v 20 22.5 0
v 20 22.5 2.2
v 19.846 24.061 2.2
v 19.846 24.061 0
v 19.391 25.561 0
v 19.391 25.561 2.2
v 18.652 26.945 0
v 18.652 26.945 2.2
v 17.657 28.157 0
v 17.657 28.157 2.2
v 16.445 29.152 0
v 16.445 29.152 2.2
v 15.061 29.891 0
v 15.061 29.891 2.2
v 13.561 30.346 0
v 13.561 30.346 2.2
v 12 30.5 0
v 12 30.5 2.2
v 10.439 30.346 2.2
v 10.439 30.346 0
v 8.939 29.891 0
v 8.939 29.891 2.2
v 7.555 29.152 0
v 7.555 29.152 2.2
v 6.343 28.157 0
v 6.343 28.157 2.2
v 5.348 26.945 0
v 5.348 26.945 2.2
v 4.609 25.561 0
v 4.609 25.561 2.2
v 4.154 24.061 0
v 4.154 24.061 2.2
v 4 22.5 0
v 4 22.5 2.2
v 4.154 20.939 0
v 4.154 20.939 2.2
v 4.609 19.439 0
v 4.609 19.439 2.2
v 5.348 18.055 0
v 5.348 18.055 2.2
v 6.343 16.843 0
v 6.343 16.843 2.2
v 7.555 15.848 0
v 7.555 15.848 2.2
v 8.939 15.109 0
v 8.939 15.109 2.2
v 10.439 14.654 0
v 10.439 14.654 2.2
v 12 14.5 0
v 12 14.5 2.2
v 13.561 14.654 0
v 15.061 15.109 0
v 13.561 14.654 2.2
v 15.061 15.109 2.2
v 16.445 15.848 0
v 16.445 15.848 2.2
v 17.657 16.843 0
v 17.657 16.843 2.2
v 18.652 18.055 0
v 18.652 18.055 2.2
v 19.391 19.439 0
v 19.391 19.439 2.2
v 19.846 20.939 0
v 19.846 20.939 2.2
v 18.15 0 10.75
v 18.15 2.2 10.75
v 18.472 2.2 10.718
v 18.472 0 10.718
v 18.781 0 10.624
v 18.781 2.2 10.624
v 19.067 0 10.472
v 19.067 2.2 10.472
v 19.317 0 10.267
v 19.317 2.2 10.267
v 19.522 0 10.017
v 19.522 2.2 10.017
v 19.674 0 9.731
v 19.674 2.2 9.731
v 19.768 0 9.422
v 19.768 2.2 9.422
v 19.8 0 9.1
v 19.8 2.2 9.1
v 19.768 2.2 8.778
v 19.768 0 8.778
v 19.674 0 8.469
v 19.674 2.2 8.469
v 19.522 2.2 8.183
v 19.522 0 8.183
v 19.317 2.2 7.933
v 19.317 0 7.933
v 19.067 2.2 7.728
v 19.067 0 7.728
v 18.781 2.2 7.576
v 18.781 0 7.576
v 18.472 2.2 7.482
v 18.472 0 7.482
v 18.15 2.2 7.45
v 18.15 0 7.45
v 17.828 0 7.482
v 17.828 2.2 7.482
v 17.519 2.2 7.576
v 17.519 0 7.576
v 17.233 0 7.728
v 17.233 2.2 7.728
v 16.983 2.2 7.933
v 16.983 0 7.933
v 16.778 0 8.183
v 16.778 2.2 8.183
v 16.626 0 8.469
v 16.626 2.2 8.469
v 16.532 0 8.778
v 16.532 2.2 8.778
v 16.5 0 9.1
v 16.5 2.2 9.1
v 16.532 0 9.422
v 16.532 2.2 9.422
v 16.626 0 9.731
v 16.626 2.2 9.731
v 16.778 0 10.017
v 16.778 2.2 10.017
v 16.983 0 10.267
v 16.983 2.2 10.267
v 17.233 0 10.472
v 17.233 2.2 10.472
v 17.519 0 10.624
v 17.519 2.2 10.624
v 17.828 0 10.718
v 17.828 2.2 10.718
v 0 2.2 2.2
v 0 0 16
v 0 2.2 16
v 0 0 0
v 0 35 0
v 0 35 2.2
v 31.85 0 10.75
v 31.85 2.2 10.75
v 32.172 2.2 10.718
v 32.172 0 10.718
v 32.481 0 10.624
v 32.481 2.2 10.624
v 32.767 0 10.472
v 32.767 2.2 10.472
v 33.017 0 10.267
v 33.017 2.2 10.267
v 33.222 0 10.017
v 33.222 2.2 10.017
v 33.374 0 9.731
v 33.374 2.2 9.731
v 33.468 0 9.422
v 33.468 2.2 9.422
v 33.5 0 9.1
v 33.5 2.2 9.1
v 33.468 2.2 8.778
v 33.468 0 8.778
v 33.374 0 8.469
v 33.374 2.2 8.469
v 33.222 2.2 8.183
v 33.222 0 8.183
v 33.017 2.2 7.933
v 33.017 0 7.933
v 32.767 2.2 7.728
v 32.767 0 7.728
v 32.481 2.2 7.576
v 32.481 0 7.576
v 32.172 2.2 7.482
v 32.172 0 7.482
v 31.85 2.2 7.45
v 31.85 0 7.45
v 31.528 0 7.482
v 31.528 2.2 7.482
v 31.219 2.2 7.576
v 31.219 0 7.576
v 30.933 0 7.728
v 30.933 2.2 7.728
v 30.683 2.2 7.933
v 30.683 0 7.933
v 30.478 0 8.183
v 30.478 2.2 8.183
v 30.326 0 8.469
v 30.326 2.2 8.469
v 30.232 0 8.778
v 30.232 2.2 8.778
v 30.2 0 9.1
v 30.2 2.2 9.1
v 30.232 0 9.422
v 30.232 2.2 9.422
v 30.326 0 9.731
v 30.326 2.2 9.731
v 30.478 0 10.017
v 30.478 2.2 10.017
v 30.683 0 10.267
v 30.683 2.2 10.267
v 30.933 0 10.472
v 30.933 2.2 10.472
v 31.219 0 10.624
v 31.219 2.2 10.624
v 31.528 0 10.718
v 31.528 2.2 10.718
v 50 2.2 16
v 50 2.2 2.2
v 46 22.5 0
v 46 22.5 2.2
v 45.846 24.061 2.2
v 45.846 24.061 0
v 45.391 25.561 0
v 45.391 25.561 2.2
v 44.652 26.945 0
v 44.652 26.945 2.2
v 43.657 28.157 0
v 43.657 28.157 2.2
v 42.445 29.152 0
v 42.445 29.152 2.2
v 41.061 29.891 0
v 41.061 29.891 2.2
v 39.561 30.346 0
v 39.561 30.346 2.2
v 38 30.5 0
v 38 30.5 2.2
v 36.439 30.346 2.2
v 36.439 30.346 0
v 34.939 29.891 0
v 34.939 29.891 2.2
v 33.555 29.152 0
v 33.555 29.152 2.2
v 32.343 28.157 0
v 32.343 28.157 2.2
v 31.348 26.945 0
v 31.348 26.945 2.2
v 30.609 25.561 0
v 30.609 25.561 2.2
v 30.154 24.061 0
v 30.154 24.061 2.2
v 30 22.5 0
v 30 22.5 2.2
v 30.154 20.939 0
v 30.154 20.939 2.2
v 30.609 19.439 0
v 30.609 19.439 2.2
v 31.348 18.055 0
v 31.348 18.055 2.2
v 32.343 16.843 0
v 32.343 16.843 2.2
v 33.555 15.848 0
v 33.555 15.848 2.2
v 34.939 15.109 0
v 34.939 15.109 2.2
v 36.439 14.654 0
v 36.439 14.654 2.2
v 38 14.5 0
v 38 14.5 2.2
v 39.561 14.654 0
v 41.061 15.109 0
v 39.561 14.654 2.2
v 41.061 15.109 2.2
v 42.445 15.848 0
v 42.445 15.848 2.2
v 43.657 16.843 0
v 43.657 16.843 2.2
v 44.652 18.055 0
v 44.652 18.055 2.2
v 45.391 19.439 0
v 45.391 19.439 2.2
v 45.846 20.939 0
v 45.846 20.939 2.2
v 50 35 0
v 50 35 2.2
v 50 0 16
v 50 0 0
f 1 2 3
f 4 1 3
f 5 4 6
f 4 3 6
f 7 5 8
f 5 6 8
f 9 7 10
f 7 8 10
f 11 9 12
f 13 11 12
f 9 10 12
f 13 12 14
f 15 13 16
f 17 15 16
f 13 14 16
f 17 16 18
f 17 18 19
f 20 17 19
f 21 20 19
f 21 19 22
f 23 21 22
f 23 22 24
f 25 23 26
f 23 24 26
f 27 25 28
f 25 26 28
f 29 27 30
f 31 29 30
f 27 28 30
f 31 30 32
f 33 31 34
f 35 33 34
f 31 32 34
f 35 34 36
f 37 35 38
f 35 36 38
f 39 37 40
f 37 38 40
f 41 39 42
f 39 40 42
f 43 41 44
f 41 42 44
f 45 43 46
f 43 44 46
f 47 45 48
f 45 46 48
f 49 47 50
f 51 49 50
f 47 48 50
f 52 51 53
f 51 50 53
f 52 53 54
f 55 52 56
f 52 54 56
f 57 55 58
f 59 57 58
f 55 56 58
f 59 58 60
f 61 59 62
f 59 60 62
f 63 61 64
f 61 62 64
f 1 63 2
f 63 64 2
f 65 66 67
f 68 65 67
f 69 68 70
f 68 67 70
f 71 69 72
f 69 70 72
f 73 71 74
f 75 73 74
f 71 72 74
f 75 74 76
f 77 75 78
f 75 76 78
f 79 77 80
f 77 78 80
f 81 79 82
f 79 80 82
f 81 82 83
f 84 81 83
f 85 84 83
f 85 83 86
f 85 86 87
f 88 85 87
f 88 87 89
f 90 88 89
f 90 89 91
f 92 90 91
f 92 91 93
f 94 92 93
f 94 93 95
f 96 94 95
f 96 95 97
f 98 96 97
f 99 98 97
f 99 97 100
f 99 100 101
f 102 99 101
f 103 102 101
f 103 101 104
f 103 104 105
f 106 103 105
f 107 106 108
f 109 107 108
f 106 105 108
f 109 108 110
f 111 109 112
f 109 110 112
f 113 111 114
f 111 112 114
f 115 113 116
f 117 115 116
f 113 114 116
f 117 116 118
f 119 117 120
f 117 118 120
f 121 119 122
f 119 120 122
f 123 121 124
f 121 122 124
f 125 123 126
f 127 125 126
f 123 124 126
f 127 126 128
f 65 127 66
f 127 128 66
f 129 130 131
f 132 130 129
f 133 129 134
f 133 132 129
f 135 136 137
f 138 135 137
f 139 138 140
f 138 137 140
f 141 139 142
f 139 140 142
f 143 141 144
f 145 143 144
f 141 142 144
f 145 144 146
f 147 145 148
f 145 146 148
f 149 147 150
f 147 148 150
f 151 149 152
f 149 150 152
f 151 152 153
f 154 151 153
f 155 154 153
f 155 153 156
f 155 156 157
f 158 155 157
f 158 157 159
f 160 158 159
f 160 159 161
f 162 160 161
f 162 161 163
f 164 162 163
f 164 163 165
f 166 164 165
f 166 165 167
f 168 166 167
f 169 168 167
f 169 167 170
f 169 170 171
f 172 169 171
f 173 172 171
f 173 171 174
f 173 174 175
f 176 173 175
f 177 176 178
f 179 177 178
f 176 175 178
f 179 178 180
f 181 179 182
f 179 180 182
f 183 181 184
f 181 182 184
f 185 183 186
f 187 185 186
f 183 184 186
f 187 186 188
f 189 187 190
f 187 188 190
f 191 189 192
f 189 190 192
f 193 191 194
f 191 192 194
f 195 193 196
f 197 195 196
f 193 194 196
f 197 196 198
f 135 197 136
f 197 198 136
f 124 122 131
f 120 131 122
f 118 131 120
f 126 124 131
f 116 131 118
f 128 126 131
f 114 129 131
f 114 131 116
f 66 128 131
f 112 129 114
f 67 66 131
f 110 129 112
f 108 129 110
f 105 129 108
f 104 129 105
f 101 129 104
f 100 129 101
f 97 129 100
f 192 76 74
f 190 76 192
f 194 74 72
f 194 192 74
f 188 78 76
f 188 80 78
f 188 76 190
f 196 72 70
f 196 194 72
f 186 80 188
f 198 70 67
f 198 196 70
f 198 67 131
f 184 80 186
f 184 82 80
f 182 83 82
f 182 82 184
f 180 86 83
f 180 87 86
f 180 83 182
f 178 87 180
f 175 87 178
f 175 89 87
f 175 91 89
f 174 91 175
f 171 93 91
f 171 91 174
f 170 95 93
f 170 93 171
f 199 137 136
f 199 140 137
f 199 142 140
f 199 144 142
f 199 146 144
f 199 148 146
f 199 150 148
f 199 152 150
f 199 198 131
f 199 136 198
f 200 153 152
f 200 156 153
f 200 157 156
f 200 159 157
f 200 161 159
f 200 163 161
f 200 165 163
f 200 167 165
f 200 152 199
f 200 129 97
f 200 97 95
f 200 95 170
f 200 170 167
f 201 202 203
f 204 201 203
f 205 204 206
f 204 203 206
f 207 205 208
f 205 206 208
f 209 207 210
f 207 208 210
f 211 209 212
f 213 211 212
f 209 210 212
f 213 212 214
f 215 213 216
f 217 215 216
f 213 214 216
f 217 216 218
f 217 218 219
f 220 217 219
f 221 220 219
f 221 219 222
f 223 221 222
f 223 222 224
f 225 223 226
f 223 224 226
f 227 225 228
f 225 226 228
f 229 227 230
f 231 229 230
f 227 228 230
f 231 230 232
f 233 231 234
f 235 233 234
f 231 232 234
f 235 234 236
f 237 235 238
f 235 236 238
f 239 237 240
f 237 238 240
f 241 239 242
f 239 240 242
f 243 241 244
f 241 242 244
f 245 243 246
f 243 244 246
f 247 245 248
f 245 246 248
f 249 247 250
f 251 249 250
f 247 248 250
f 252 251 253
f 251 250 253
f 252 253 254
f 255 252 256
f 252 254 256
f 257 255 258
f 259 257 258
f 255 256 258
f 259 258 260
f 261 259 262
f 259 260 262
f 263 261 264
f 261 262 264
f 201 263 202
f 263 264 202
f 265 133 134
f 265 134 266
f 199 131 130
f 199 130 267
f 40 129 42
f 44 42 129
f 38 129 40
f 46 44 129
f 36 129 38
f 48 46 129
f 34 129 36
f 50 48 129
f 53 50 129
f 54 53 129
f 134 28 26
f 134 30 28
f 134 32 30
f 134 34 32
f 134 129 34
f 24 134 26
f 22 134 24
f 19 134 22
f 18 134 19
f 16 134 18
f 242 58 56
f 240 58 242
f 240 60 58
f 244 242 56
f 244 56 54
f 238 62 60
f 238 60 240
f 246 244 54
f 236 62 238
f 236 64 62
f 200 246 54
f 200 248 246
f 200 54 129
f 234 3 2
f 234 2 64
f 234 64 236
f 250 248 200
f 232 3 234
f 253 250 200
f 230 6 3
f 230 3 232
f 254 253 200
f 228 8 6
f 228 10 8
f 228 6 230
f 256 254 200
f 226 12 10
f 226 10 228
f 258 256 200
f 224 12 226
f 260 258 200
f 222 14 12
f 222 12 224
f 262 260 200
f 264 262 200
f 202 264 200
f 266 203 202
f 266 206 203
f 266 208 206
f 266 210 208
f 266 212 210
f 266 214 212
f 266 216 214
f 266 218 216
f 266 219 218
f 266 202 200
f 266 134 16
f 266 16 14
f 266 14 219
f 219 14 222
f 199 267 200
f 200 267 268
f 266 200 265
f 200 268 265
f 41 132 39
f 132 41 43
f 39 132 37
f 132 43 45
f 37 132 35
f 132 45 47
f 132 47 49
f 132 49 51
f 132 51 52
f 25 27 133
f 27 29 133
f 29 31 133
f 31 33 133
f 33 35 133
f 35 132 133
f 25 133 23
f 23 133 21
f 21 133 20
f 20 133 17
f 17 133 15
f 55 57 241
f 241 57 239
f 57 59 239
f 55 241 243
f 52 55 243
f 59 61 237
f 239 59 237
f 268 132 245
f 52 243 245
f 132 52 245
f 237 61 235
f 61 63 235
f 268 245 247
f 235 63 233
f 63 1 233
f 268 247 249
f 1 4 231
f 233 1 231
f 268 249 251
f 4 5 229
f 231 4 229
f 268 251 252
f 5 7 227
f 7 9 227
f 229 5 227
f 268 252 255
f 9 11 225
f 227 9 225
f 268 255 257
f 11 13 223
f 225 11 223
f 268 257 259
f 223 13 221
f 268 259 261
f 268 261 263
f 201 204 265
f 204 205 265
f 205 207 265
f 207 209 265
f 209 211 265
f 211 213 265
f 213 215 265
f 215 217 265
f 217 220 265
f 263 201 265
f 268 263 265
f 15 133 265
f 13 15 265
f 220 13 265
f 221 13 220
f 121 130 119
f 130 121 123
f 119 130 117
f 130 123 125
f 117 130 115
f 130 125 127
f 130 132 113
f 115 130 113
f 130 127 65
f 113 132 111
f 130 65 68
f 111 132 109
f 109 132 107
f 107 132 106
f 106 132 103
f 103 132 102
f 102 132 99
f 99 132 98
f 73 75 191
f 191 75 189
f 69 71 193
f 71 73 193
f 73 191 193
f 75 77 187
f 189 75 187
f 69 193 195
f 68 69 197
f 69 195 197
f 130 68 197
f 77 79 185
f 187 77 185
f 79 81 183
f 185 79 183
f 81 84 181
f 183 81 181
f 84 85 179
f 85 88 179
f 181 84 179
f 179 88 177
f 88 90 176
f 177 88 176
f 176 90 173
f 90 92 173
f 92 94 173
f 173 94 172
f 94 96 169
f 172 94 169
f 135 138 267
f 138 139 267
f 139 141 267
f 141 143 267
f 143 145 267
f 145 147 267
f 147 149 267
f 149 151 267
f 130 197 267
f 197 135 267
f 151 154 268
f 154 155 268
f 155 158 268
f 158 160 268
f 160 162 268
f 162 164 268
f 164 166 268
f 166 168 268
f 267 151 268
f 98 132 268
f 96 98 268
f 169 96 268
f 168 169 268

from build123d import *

# Parameters (mm, degrees)
SKETCH_1_W          = 50
SKETCH_1_H          = 35
EXTRUDE_1_DEPTH     = 2.2
SKETCH_2_R          = 8
CUT_EXTRUDE_1_DEPTH = 2.2
SKETCH_3_W          = 50
SKETCH_3_H          = 2.2
EXTRUDE_2_DEPTH     = 13.8
SKETCH_4_R          = 1.65
CUT_EXTRUDE_2_DEPTH = 13.8


with BuildPart() as part:
    # 草图1 → 凸台-拉伸1 (new body)
    with BuildSketch(Plane.XY):
        with Locations((25, 17.5)):
            Rectangle(SKETCH_1_W, SKETCH_1_H)
    extrude(amount=EXTRUDE_1_DEPTH)

    # 草图2 → 切除-拉伸1 (cut)
    with BuildSketch(Plane.XY.offset(2.2)):
        with Locations((12, 22.5)):
            Circle(SKETCH_2_R)
        with Locations((38, 22.5)):
            Circle(SKETCH_2_R)
    extrude(amount=-CUT_EXTRUDE_1_DEPTH, mode=Mode.SUBTRACT)

    # 草图3 → 凸台-拉伸2 (add)
    with BuildSketch(Plane.XY.offset(2.2)):
        with Locations((25, 1.1)):
            Rectangle(SKETCH_3_W, SKETCH_3_H)
    extrude(amount=EXTRUDE_2_DEPTH)

    # 草图4 → 切除-拉伸2 (cut)
    with BuildSketch(Plane(origin=(0, 2.2, 0), x_dir=(1, 0, 0), z_dir=(0, 1, 0))):
        with Locations(Location((18.15, -9.1, 0), (0, 0, 270))):
            Circle(SKETCH_4_R)
        with Locations(Location((31.85, -9.1, 0), (0, 0, 270))):
            Circle(SKETCH_4_R)
    extrude(amount=-CUT_EXTRUDE_2_DEPTH, mode=Mode.SUBTRACT)


solid = part.part
